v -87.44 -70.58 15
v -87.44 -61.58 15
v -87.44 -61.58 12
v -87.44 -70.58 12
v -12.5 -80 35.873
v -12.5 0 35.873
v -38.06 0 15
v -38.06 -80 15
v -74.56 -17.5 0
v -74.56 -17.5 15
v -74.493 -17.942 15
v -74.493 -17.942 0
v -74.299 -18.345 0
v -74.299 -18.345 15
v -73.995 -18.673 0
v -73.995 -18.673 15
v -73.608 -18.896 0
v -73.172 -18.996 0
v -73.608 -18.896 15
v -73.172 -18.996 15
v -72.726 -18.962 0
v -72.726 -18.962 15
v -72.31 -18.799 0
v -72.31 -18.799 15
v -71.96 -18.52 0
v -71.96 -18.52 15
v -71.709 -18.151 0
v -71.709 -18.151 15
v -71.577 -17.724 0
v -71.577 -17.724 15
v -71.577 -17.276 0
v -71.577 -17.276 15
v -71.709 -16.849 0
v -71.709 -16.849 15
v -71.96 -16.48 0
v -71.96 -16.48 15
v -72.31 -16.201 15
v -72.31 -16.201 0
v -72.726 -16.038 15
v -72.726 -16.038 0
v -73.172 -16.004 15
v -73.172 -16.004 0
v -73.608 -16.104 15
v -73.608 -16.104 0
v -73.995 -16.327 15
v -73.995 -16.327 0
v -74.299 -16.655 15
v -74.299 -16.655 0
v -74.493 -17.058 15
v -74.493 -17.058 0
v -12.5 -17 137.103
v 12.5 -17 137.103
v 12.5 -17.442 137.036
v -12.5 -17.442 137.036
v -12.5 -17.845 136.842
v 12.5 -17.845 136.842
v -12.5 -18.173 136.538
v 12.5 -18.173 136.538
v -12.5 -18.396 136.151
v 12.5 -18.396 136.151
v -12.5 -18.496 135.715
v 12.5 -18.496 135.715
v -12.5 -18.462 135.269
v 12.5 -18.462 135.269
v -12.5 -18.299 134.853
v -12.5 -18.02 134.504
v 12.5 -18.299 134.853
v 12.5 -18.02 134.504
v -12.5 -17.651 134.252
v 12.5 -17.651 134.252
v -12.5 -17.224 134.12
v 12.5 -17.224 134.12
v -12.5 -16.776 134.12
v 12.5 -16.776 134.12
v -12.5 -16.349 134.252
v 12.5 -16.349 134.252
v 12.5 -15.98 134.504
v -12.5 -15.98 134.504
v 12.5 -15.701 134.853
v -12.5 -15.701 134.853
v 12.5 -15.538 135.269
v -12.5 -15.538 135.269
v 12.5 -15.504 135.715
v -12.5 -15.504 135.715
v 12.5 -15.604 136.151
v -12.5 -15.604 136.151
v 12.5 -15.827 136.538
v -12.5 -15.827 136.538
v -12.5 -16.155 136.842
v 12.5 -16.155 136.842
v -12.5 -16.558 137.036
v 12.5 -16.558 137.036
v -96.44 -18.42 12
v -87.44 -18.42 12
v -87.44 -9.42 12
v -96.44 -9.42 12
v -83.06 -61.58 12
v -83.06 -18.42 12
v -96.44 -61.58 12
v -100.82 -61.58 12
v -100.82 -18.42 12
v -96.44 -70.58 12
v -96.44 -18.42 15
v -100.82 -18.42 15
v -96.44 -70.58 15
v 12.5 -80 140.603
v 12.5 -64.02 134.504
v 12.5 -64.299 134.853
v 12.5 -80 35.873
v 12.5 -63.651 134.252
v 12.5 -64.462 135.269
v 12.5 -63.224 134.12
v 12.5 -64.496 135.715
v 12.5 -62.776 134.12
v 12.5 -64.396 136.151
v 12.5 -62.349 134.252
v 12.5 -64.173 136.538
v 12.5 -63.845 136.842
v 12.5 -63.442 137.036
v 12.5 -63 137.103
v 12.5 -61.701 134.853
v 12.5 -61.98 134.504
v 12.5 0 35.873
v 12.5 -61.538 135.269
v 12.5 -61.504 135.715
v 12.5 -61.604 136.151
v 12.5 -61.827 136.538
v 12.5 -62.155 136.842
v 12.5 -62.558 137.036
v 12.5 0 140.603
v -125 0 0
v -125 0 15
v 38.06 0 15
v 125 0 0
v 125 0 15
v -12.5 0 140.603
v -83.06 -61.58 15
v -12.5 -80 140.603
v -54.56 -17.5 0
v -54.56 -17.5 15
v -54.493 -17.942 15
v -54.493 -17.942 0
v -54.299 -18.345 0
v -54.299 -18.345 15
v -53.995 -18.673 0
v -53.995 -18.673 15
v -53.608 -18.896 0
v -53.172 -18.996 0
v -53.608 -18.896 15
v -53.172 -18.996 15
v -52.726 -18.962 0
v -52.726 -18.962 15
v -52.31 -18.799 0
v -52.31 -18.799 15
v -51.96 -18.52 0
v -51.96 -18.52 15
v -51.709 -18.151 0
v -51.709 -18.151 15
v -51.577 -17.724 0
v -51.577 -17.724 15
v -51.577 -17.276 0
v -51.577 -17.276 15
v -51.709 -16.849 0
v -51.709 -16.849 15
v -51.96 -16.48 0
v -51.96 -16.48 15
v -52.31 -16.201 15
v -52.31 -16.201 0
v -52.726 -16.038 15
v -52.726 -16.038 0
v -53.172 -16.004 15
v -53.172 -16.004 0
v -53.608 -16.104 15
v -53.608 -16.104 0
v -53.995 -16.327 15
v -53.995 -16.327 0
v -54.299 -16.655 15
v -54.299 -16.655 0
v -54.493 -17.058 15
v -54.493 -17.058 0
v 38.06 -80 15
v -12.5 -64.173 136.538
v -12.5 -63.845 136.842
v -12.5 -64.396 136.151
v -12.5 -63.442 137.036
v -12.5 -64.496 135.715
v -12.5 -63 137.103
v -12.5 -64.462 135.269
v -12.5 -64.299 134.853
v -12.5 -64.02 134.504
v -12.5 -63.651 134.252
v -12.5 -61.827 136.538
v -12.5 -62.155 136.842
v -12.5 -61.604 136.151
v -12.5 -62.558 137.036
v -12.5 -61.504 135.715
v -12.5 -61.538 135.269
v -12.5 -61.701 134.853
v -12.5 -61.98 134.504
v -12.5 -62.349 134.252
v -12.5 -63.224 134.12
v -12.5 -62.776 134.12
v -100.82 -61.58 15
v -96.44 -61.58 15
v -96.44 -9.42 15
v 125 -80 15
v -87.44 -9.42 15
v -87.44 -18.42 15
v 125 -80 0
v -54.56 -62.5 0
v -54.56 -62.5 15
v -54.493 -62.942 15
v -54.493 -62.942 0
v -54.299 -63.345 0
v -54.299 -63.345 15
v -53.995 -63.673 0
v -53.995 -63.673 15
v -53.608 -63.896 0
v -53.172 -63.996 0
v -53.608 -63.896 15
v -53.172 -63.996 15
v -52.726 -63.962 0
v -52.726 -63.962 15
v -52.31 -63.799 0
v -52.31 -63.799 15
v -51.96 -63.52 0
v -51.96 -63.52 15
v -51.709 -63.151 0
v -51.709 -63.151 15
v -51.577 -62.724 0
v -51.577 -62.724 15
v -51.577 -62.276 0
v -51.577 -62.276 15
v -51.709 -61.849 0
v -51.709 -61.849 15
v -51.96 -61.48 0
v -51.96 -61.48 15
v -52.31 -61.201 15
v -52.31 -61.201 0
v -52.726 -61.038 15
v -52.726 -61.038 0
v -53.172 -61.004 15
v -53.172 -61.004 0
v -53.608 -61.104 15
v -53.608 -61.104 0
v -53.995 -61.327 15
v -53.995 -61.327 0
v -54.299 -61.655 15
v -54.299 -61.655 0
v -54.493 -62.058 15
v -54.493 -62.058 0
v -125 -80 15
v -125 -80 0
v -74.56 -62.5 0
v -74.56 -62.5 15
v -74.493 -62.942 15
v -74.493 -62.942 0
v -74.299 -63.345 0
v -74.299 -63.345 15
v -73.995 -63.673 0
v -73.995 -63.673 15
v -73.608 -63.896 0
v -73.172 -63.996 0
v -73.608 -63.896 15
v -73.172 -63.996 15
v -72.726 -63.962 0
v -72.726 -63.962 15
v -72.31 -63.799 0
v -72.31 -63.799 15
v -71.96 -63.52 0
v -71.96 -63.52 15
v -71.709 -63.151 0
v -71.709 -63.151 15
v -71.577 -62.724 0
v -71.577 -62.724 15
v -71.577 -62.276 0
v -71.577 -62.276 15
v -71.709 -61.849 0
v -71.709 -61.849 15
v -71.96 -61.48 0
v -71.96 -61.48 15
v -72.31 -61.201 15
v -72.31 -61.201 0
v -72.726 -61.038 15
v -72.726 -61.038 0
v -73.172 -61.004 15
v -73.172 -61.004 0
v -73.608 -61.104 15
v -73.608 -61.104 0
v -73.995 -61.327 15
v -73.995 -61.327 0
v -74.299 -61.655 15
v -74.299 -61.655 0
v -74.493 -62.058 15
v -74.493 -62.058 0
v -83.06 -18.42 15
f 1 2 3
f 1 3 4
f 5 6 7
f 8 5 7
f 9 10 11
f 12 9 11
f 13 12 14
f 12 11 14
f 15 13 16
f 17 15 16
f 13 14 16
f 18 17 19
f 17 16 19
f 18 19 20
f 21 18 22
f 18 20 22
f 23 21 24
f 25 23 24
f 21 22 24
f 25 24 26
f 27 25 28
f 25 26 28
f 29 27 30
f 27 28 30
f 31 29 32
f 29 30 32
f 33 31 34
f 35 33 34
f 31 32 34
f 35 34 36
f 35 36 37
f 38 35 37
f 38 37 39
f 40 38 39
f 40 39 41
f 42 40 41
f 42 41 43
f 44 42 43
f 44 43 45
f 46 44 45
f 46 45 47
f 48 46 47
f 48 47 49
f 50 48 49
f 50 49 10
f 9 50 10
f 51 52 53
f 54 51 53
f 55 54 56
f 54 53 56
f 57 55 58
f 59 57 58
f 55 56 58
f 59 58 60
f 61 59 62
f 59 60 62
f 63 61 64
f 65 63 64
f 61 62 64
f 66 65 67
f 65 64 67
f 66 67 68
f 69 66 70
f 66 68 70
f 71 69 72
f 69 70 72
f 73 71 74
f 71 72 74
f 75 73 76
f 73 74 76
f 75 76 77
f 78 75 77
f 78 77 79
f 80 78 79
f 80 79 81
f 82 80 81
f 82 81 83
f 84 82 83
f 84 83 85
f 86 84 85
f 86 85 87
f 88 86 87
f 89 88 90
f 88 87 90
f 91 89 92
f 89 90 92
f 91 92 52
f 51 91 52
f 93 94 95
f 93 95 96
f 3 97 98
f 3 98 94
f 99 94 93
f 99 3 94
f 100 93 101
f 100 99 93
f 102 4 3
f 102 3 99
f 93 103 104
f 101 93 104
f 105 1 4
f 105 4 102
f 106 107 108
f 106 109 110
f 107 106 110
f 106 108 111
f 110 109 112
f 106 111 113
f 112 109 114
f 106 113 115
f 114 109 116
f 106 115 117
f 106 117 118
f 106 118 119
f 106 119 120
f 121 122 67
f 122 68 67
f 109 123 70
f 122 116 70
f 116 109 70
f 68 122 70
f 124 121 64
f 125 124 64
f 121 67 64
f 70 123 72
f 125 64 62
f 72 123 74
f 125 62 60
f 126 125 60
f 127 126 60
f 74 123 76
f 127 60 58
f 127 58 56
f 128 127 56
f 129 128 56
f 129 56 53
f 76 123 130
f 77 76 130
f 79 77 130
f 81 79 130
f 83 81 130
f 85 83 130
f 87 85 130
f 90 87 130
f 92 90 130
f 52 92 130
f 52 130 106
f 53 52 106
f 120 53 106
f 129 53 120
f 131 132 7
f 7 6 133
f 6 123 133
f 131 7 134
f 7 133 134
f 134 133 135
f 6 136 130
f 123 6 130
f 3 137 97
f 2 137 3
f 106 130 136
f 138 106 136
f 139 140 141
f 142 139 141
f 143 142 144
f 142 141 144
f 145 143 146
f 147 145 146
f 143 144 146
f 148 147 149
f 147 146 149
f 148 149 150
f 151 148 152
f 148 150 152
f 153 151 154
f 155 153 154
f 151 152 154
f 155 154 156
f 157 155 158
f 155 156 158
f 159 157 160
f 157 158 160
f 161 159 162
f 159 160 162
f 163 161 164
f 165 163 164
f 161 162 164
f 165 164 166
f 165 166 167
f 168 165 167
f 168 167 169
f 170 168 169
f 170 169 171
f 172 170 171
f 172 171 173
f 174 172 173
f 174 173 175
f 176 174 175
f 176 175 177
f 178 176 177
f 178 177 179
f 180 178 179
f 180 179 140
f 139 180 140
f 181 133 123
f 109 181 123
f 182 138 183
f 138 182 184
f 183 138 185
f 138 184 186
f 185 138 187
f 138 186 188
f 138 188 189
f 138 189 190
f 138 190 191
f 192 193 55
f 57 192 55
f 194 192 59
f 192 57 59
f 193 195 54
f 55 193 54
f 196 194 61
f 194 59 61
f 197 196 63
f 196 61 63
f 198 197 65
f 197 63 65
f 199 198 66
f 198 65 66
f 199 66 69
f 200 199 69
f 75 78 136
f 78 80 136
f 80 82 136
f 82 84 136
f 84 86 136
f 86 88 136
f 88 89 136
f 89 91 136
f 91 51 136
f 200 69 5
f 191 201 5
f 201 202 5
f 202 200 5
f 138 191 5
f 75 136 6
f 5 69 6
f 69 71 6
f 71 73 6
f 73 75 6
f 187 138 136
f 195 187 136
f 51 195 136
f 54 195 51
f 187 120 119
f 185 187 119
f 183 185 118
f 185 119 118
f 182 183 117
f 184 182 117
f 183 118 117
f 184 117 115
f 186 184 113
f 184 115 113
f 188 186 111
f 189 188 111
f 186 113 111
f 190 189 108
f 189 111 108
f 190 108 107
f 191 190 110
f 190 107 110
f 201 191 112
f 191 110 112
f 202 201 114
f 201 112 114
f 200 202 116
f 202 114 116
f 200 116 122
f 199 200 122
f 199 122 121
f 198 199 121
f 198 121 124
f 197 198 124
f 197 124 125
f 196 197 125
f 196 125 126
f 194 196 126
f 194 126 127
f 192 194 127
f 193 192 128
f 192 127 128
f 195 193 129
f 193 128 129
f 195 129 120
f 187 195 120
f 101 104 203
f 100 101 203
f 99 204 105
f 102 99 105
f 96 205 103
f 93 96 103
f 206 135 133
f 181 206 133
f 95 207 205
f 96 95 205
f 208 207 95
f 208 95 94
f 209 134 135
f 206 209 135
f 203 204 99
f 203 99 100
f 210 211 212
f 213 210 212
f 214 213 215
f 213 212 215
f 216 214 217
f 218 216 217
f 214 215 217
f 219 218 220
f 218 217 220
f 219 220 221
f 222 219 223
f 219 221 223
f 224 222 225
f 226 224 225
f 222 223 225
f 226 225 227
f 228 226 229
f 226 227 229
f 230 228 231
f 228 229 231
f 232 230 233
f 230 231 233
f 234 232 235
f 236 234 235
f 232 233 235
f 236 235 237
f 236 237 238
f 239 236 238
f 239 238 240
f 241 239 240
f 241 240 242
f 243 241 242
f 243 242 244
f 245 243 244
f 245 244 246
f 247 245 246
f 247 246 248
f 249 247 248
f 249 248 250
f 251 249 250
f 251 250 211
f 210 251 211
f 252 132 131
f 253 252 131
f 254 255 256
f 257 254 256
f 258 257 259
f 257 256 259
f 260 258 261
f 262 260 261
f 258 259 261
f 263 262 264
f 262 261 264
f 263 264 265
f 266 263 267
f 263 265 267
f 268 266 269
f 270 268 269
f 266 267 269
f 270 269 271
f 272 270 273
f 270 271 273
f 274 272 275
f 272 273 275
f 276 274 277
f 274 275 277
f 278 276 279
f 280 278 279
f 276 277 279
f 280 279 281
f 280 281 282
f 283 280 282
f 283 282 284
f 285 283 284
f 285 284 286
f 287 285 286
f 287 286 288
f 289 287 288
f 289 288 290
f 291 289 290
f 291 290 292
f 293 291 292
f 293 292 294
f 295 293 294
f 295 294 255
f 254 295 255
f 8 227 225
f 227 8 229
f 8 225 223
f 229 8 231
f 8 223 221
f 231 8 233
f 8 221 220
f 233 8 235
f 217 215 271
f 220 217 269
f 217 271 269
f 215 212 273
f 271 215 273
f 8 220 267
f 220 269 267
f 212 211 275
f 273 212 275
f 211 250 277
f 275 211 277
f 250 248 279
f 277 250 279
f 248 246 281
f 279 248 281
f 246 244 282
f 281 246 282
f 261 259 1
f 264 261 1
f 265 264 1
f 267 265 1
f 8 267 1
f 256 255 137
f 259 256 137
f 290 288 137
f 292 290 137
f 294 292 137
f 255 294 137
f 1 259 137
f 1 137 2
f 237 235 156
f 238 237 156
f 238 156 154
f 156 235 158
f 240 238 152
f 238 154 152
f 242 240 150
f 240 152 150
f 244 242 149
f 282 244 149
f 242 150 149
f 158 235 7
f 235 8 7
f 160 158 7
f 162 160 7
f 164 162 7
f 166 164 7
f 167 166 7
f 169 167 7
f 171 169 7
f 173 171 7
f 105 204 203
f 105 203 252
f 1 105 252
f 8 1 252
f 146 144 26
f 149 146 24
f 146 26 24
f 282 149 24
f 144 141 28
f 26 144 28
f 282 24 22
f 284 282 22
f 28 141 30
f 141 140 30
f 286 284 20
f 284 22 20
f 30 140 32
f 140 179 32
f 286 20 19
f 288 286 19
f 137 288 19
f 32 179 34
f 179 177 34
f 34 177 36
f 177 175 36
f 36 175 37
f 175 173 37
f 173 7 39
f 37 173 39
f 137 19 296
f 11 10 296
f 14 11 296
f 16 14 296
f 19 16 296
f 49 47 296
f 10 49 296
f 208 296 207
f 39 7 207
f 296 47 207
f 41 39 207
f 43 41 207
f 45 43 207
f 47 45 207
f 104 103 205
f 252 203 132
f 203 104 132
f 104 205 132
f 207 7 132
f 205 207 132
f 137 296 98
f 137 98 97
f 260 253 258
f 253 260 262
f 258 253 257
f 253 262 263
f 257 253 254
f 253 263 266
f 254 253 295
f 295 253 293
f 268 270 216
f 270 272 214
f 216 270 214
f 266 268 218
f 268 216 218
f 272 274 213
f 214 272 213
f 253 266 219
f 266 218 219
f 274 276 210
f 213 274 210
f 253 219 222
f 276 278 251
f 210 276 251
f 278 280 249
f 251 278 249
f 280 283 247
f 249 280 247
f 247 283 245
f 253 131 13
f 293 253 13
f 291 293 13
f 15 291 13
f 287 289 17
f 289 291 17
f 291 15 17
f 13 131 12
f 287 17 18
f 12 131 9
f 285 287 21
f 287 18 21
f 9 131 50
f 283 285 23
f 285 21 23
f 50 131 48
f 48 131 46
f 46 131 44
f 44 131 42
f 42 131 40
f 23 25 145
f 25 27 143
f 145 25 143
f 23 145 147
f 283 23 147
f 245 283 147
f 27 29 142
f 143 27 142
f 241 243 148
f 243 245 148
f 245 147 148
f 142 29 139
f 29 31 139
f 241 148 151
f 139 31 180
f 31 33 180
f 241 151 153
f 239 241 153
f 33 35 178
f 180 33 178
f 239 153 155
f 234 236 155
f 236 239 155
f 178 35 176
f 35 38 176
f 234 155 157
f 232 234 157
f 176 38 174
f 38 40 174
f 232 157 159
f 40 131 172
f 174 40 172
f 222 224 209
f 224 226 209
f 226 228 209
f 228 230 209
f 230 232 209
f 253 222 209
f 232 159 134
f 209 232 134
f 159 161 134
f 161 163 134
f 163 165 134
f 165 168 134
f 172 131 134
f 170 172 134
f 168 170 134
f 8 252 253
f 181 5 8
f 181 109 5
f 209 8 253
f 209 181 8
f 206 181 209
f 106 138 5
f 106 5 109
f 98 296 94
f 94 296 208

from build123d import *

# Parameters (mm, degrees)
PAD_DEPTH       = 80
SKETCH001_R     = 1.5
HOLE_DEPTH      = 25
HOLE_TIPS_R     = 1.5
SKETCH002_R     = 1.5
HOLE001_DEPTH   = 25
SKETCH003_W     = 17.76
SKETCH003_H     = 43.16
POCKET_DEPTH    = 3
SKETCH004_W     = 9
SKETCH004_H     = 9
POCKET001_DEPTH = 3


with BuildPart() as part:
    # Sketch → Pad (new body)
    with BuildSketch(Plane.XZ):
        Polygon((-125, 0), (125, 0), (125, 15), (38.06, 15), (12.5, 35.873102), (12.5, 140.603102), (-12.5, 140.603102), (-12.5, 35.873102), (-38.06, 15), (-125, 15), align=None)
    extrude(amount=PAD_DEPTH)

    # Sketch001 (on Face5 of Pad) → Hole (cut)
    with BuildSketch(Plane(origin=(12.5, 0, 0), x_dir=(0, 0, 1), z_dir=(1, 0, 0))):
        with Locations((135.603102, 63)):
            Circle(SKETCH001_R)
        with Locations((135.603102, 17)):
            Circle(SKETCH001_R)
    extrude(amount=-HOLE_DEPTH, mode=Mode.SUBTRACT)

    # Hole tips → Hole tip 1 section 0
    with BuildSketch(Plane(origin=(-12.5, 0, 0), x_dir=(0, 0, 1), z_dir=(1, 0, 0)), mode=Mode.PRIVATE) as hole_tip_1_s0:
        with Locations((135.603102, 63)):
            Circle(HOLE_TIPS_R)
    loft([hole_tip_1_s0.sketch, Vertex(-13.401291, -63, 135.603102)], mode=Mode.SUBTRACT)

    # Hole tips → Hole tip 2 section 0
    with BuildSketch(Plane(origin=(-12.5, 0, 0), x_dir=(0, 0, 1), z_dir=(1, 0, 0)), mode=Mode.PRIVATE) as hole_tip_2_s0:
        with Locations((135.603102, 17)):
            Circle(HOLE_TIPS_R)
    loft([hole_tip_2_s0.sketch, Vertex(-13.401291, -17, 135.603102)], mode=Mode.SUBTRACT)

    # Sketch002 (on Face7 of Hole) → Hole001 (cut)
    with BuildSketch(Plane(origin=(0, 0, 15), x_dir=(-1, 0, 0), z_dir=(0, 0, 1))):
        with Locations((53.06, 62.5)):
            Circle(SKETCH002_R)
        with Locations((73.06, 62.5)):
            Circle(SKETCH002_R)
        with Locations((53.06, 17.5)):
            Circle(SKETCH002_R)
        with Locations((73.06, 17.5)):
            Circle(SKETCH002_R)
    extrude(amount=-HOLE001_DEPTH, mode=Mode.SUBTRACT)

    # Sketch003 (on Face10 of Hole001) → Pocket (cut)
    with BuildSketch(Plane(origin=(0, 0, 15), x_dir=(-1, 0, 0), z_dir=(0, 0, 1))):
        with Locations((91.94, 40)):
            Rectangle(SKETCH003_W, SKETCH003_H)
    extrude(amount=-POCKET_DEPTH, mode=Mode.SUBTRACT)

    # Sketch004 (on Face10 of Pocket) → Pocket001 (cut)
    with BuildSketch(Plane(origin=(0, 0, 15), x_dir=(-1, 0, 0), z_dir=(0, 0, 1))):
        with Locations((91.94, 66.08)):
            Rectangle(SKETCH004_W, SKETCH004_H)
        with Locations((91.94, 13.92)):
            Rectangle(SKETCH004_W, SKETCH004_H)
    extrude(amount=-POCKET001_DEPTH, mode=Mode.SUBTRACT)


solid = part.part
